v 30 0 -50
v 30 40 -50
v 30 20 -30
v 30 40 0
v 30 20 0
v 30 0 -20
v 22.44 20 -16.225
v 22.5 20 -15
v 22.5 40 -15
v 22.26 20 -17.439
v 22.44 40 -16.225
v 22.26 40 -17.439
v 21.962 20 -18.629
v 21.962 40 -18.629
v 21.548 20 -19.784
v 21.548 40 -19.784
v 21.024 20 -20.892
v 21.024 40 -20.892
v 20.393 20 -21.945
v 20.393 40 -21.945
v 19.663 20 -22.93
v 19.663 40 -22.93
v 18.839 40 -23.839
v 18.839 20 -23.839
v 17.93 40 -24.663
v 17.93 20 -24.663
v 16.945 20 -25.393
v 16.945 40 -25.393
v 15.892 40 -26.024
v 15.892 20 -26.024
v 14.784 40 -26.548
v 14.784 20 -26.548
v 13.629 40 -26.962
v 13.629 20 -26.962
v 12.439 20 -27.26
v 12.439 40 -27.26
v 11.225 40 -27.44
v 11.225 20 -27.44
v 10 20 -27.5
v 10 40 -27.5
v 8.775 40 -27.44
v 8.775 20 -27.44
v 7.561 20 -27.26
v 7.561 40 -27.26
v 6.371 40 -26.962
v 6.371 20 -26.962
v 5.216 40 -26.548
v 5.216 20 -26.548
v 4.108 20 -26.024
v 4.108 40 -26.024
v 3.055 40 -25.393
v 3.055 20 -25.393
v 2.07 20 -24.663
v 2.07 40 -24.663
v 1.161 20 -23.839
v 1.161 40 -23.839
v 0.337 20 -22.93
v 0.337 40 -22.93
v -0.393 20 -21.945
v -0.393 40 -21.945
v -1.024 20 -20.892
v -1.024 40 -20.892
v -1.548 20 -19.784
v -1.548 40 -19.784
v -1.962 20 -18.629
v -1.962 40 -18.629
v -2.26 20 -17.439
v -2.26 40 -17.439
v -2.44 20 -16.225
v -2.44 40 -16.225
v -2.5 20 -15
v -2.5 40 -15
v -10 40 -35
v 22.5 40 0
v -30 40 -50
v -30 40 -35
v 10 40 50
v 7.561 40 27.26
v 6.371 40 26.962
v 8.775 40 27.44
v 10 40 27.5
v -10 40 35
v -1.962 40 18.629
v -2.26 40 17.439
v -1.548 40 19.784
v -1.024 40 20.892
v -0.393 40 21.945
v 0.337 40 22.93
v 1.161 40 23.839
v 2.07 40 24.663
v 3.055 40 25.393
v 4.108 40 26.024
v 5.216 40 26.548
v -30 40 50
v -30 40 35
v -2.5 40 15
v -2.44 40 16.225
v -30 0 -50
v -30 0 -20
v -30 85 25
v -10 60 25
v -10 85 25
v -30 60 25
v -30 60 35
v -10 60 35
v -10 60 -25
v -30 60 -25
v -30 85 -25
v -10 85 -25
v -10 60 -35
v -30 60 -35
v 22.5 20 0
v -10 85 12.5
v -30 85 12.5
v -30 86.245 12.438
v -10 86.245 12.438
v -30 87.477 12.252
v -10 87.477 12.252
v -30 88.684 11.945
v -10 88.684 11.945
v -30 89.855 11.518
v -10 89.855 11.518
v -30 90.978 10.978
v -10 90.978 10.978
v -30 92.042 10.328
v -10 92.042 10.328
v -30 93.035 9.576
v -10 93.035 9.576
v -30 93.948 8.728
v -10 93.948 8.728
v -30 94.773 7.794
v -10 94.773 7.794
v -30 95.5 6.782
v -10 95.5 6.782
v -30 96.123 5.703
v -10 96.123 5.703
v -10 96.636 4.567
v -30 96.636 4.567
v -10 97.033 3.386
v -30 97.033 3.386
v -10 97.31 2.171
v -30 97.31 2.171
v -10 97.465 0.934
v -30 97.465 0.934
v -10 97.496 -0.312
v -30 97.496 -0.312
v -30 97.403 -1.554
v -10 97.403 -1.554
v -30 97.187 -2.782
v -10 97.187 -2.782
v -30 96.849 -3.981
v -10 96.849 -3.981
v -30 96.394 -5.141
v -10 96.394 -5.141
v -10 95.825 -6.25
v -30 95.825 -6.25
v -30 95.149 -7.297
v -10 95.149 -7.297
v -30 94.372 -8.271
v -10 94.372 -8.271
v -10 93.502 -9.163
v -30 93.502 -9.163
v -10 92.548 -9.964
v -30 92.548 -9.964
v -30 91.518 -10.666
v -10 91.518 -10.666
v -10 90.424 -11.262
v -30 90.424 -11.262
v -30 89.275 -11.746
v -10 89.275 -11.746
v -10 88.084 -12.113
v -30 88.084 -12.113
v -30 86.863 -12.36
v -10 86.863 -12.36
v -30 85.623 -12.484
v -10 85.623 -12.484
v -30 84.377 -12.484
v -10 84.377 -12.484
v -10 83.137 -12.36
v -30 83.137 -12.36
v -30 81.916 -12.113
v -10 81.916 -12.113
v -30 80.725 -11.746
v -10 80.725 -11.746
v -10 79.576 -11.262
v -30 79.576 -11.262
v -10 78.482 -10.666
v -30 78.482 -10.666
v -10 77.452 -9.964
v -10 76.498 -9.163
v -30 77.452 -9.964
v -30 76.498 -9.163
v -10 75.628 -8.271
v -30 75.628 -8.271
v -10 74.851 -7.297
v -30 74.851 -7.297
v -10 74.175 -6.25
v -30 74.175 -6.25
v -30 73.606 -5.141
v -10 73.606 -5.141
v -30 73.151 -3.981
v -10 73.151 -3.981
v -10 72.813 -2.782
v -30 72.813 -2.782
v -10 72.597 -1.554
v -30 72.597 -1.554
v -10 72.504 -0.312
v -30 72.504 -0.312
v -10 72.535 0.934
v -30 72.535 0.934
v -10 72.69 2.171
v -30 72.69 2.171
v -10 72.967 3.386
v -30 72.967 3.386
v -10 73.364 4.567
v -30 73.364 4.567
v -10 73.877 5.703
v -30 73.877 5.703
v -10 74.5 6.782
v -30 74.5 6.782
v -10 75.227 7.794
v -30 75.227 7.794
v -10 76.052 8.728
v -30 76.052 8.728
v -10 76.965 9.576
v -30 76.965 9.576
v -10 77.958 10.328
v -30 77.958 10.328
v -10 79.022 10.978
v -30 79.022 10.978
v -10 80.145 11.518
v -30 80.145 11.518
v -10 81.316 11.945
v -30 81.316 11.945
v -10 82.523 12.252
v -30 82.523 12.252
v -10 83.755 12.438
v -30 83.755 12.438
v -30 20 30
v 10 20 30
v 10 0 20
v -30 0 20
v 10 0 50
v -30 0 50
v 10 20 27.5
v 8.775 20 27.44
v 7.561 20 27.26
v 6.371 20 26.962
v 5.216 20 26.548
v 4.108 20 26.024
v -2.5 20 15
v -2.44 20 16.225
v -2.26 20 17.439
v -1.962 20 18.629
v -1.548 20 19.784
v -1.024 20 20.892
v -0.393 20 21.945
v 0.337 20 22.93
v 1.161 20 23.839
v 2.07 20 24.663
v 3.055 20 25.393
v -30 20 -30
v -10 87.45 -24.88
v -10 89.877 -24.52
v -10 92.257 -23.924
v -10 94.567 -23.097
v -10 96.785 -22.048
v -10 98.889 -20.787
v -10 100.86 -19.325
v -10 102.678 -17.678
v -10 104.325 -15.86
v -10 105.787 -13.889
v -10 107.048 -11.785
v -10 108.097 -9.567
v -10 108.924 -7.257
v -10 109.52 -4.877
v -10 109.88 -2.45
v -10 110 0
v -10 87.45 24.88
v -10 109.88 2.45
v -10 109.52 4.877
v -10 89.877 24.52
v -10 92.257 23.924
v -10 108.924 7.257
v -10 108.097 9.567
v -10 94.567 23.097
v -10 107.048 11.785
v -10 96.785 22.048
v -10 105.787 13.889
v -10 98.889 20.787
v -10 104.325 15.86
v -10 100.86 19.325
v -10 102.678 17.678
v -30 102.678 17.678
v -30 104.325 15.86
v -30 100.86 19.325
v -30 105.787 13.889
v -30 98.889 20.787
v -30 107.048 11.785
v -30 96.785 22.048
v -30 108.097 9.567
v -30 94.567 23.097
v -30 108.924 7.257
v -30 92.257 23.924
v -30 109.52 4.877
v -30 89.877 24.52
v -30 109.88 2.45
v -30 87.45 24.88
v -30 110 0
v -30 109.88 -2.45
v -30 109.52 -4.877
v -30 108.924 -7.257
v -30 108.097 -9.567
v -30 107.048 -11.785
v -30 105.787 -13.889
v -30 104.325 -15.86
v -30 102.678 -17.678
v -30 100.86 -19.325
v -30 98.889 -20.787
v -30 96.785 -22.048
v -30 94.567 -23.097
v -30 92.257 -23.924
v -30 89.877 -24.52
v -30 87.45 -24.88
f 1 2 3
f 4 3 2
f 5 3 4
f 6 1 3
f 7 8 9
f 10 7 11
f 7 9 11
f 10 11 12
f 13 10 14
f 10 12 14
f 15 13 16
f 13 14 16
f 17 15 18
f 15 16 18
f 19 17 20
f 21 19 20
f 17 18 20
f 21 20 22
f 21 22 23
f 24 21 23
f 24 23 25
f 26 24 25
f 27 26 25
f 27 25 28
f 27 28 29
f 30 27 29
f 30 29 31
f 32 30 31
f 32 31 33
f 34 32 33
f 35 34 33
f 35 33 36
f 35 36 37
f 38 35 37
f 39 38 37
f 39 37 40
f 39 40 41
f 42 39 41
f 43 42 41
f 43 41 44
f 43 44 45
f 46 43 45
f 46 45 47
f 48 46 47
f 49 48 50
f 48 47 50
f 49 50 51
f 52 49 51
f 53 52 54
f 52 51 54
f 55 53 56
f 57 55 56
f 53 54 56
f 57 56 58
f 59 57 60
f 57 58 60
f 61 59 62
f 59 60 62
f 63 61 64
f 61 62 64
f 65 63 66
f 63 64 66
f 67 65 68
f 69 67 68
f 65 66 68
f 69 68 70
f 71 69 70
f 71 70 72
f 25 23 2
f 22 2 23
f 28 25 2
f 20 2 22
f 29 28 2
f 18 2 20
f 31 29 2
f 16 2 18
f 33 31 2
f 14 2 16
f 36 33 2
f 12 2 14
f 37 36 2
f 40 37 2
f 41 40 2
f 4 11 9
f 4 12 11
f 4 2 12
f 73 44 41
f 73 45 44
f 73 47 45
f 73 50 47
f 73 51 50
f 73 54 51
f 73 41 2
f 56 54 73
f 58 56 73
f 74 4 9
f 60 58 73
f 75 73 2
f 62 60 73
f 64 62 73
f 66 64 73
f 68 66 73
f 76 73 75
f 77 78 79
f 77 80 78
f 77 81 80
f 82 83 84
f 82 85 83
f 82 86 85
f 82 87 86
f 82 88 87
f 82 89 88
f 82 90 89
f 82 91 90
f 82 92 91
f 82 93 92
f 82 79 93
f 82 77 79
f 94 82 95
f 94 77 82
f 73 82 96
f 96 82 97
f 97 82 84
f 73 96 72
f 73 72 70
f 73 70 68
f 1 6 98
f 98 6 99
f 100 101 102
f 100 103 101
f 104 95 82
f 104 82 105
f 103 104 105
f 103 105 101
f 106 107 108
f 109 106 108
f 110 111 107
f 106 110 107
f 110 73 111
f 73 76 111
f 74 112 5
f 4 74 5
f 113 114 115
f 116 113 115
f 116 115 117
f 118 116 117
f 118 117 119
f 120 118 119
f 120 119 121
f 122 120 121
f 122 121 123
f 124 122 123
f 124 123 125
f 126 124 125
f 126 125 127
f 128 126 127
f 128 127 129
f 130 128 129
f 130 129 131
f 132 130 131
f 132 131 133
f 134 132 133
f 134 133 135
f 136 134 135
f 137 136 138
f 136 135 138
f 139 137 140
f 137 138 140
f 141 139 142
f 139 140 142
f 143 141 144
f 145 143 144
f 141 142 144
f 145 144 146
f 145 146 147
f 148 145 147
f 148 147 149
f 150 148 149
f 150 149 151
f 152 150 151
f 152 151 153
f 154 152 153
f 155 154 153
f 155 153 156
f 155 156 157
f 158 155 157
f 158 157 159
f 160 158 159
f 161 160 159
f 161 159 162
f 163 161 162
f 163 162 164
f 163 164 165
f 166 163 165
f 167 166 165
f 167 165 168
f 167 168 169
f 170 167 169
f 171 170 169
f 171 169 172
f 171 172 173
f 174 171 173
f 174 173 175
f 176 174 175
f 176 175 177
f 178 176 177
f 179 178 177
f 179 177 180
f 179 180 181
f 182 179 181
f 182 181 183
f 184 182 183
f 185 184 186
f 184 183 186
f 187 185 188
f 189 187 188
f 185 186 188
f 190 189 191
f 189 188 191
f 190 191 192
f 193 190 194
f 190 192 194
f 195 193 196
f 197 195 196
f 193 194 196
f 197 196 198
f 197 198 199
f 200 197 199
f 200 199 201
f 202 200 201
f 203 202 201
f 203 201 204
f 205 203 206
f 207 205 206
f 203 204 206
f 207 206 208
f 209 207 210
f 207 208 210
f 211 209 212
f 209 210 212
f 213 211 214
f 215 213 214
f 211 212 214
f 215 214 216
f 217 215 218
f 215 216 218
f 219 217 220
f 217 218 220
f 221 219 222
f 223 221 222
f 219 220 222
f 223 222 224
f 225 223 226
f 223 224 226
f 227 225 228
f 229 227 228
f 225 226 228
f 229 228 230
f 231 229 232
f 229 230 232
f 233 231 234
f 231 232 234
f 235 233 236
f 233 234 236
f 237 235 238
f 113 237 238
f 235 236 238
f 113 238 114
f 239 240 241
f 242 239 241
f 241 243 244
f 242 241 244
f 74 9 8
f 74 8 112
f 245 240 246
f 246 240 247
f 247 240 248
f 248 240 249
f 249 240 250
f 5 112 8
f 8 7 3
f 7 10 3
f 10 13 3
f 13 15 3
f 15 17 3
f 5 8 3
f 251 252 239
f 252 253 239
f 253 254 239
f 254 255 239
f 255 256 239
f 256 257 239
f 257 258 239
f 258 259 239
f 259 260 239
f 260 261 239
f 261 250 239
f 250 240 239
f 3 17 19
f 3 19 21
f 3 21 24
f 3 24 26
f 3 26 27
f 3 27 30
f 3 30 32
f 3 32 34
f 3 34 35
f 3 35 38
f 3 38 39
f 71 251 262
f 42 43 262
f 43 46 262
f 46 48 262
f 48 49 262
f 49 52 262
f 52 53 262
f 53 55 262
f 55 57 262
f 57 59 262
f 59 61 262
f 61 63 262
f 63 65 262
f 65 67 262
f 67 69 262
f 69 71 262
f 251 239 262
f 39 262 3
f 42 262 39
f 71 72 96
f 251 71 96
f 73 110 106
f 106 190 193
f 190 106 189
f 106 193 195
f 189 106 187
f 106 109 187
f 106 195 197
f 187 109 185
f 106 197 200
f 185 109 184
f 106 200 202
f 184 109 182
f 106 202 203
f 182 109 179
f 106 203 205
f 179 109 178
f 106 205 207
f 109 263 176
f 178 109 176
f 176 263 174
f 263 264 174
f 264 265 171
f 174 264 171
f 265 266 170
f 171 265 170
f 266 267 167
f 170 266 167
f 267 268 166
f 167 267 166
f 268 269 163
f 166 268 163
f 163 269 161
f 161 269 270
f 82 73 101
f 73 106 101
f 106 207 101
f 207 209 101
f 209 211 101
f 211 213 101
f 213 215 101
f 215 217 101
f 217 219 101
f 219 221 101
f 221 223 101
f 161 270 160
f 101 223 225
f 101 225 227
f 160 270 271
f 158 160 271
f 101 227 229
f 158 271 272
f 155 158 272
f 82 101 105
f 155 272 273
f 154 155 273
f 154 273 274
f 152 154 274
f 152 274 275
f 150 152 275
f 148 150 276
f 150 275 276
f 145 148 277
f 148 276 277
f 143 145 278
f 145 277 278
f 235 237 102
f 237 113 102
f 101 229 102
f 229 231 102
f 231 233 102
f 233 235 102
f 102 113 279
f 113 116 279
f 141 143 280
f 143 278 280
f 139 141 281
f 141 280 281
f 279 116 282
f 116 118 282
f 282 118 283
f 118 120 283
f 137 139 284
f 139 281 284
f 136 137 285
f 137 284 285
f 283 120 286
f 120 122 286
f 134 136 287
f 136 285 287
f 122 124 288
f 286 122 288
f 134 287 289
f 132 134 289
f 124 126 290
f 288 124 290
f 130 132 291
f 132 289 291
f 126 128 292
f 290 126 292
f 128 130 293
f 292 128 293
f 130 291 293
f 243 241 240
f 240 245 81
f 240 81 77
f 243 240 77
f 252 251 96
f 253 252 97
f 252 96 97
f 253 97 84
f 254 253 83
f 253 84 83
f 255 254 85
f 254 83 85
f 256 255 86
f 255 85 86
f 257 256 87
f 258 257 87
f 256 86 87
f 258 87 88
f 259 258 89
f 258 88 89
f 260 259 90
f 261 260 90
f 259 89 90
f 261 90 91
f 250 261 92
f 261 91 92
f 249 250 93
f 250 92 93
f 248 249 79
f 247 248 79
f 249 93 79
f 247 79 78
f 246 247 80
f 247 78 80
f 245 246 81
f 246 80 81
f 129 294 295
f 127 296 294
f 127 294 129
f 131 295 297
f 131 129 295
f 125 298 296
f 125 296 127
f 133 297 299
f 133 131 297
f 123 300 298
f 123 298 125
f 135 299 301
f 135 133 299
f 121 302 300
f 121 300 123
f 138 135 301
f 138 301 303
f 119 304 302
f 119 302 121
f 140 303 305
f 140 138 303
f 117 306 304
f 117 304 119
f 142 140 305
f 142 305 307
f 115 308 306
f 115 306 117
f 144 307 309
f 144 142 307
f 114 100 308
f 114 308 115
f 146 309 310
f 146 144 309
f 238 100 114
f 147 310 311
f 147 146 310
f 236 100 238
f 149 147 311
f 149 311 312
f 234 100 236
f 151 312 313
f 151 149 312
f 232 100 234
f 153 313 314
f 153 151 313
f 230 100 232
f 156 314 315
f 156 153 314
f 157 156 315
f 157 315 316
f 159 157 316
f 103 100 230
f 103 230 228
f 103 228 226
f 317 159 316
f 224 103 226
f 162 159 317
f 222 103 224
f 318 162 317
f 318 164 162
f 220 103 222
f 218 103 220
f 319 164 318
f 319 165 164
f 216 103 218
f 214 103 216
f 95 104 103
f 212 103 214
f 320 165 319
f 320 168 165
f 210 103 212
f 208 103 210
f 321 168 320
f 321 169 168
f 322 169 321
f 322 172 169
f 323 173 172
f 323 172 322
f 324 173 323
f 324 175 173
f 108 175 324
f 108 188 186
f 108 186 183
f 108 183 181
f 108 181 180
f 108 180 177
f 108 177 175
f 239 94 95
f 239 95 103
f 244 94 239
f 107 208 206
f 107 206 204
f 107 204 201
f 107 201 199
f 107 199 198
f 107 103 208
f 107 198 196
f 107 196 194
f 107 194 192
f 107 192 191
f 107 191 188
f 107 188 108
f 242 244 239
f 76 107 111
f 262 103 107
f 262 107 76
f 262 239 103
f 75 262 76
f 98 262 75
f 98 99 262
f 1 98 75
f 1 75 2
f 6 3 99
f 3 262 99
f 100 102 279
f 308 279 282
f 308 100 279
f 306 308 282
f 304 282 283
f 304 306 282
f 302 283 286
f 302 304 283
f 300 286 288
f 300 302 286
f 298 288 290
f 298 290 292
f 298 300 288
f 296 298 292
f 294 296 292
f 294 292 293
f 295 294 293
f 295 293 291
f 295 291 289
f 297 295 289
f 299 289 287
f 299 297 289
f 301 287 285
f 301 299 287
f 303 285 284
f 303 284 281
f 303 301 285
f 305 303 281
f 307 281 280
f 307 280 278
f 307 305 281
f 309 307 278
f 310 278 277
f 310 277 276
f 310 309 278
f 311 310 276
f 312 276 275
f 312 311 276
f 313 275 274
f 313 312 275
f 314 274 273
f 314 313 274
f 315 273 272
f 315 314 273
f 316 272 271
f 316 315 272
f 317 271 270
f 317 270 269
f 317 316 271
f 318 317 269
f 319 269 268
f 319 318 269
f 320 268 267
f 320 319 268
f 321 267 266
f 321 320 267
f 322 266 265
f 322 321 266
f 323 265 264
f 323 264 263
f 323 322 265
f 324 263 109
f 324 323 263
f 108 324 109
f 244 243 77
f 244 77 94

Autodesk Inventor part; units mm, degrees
ref_plane "YZ Plane" through (0, 0, 0) normal (1, 0, 0) x (0, 1, 0)
ref_plane "XZ Plane" through (0, 0, 0) normal (0, 1, 0) x (-1, 0, 0)
sketch "Эскиз1" plane through (0, 0, 0) normal (0, 1, 0) x (-1, 0, 0)
  line L0 (30, 50) -> (30, -50)
  line L1 (30, -50) -> (-30, -50)
  line L2 (-30, -50) -> (-30, 50)
  line L3 (-30, 50) -> (30, 50)
  point P0 (0, 0)
  dimension "d2" = 100
  dimension "d3" = 60
  dimension "d4" = 100
extrude "Выдавливание1" add sketch "Эскиз1" along normal blind 40
sketch "Эскиз2" plane through (30, 0, 50) normal (1, 0, 0) x (0, 0, -1)
  line L0 (30, 0) -> (70, 0)
  line L1 (20, 20) -> (80, 20)
  line L2 (80, 20) -> (70, 0)
  line L3 (20, 20) -> (30, 0)
  point P0 (50, 0)
  dimension "d8" = 40
  dimension "d11" = 60
extrude "Выдавливание2" cut sketch "Эскиз2" along normal mid plane 160
sketch "Эскиз4" plane through (0, 40, 0) normal (0, 1, 0) x (1, 0, 0)
  line L0 (30, -30) -> (30, 30) projected
  line L1 (30, -50) -> (30, 50) projected
  arc A0 (22.5, 15) -> (-2.5, 15) centre (10, 15) ccw
  arc A1 (-2.5, -15) -> (22.5, -15) centre (10, -15) ccw
  line L2 (-2.5, 15) -> (-2.5, -15)
  line L3 (22.5, 15) -> (22.5, -15)
  point P0 (0, 0)
extrude "Выдавливание5" cut sketch "Эскиз4" against normal blind 20
sketch "Эскиз5" plane through (-30, 0, 50) normal (-1, 0, 0) x (0, 0, 1)
  line L0 (0, 40) -> (-100, 40) projected
  line L1 (-100, 40) -> (-85, 40)
  line L2 (-85, 40) -> (-15, 40)
  line L3 (-85, 40) -> (-85, 60)
  line L4 (-85, 60) -> (-75, 60)
  line L5 (-15, 40) -> (-15, 60)
  line L6 (-15, 60) -> (-25, 60)
  line L7 (-25, 60) -> (-25, 85)
  line L8 (-75, 60) -> (-75, 85)
  arc A0 (-25, 85) -> (-75, 85) centre (-50, 85) ccw
  line L9 (-75, 85) -> (-25, 85)
  circle A1 centre (-50, 85) radius 12.5
  point P0 (-50, 0)
  dimension "d50" = 70
  dimension "d51" = 20
  dimension "d52" = 10
  dimension "d53" = 20
  dimension "d54" = 10
  dimension "d55" = 25
  dimension "d56" = 25
  dimension "d59" = 25
extrude "Выдавливание6" add sketch "Эскиз5" against normal blind 20 contours L0 L3 L4 L8 L9 A1 L7 L6 L5 | L9 A1 A0
ref_plane "РабПлоскость1" through (10, 0, -50) normal (1, 0, 0) x (0, 0, -1)
sketch "Эскиз6" plane through (0, 40, 0) normal (0, 1, 0) x (1, 0, 0)
  arc A0 (-2.5, -15) -> (22.5, -15) centre (10, -15) ccw projected
  line L0 (10, -15) -> (10, -69.4027)
  line L1 (10, -69.4027) -> (54.89, -69.4027)
  line L2 (54.89, -69.4027) -> (54.89, -15)
  line L3 (10, -15) -> (10, 0)
  line L4 (10, 0) -> (54.89, 0)
  line L5 (54.89, 0) -> (54.89, -15)
  point P0 (0, 0)
  dimension "d65" = 12.5
extrude "Выдавливание7" cut sketch "Эскиз6" against normal blind 80
properties part number "Урок"
